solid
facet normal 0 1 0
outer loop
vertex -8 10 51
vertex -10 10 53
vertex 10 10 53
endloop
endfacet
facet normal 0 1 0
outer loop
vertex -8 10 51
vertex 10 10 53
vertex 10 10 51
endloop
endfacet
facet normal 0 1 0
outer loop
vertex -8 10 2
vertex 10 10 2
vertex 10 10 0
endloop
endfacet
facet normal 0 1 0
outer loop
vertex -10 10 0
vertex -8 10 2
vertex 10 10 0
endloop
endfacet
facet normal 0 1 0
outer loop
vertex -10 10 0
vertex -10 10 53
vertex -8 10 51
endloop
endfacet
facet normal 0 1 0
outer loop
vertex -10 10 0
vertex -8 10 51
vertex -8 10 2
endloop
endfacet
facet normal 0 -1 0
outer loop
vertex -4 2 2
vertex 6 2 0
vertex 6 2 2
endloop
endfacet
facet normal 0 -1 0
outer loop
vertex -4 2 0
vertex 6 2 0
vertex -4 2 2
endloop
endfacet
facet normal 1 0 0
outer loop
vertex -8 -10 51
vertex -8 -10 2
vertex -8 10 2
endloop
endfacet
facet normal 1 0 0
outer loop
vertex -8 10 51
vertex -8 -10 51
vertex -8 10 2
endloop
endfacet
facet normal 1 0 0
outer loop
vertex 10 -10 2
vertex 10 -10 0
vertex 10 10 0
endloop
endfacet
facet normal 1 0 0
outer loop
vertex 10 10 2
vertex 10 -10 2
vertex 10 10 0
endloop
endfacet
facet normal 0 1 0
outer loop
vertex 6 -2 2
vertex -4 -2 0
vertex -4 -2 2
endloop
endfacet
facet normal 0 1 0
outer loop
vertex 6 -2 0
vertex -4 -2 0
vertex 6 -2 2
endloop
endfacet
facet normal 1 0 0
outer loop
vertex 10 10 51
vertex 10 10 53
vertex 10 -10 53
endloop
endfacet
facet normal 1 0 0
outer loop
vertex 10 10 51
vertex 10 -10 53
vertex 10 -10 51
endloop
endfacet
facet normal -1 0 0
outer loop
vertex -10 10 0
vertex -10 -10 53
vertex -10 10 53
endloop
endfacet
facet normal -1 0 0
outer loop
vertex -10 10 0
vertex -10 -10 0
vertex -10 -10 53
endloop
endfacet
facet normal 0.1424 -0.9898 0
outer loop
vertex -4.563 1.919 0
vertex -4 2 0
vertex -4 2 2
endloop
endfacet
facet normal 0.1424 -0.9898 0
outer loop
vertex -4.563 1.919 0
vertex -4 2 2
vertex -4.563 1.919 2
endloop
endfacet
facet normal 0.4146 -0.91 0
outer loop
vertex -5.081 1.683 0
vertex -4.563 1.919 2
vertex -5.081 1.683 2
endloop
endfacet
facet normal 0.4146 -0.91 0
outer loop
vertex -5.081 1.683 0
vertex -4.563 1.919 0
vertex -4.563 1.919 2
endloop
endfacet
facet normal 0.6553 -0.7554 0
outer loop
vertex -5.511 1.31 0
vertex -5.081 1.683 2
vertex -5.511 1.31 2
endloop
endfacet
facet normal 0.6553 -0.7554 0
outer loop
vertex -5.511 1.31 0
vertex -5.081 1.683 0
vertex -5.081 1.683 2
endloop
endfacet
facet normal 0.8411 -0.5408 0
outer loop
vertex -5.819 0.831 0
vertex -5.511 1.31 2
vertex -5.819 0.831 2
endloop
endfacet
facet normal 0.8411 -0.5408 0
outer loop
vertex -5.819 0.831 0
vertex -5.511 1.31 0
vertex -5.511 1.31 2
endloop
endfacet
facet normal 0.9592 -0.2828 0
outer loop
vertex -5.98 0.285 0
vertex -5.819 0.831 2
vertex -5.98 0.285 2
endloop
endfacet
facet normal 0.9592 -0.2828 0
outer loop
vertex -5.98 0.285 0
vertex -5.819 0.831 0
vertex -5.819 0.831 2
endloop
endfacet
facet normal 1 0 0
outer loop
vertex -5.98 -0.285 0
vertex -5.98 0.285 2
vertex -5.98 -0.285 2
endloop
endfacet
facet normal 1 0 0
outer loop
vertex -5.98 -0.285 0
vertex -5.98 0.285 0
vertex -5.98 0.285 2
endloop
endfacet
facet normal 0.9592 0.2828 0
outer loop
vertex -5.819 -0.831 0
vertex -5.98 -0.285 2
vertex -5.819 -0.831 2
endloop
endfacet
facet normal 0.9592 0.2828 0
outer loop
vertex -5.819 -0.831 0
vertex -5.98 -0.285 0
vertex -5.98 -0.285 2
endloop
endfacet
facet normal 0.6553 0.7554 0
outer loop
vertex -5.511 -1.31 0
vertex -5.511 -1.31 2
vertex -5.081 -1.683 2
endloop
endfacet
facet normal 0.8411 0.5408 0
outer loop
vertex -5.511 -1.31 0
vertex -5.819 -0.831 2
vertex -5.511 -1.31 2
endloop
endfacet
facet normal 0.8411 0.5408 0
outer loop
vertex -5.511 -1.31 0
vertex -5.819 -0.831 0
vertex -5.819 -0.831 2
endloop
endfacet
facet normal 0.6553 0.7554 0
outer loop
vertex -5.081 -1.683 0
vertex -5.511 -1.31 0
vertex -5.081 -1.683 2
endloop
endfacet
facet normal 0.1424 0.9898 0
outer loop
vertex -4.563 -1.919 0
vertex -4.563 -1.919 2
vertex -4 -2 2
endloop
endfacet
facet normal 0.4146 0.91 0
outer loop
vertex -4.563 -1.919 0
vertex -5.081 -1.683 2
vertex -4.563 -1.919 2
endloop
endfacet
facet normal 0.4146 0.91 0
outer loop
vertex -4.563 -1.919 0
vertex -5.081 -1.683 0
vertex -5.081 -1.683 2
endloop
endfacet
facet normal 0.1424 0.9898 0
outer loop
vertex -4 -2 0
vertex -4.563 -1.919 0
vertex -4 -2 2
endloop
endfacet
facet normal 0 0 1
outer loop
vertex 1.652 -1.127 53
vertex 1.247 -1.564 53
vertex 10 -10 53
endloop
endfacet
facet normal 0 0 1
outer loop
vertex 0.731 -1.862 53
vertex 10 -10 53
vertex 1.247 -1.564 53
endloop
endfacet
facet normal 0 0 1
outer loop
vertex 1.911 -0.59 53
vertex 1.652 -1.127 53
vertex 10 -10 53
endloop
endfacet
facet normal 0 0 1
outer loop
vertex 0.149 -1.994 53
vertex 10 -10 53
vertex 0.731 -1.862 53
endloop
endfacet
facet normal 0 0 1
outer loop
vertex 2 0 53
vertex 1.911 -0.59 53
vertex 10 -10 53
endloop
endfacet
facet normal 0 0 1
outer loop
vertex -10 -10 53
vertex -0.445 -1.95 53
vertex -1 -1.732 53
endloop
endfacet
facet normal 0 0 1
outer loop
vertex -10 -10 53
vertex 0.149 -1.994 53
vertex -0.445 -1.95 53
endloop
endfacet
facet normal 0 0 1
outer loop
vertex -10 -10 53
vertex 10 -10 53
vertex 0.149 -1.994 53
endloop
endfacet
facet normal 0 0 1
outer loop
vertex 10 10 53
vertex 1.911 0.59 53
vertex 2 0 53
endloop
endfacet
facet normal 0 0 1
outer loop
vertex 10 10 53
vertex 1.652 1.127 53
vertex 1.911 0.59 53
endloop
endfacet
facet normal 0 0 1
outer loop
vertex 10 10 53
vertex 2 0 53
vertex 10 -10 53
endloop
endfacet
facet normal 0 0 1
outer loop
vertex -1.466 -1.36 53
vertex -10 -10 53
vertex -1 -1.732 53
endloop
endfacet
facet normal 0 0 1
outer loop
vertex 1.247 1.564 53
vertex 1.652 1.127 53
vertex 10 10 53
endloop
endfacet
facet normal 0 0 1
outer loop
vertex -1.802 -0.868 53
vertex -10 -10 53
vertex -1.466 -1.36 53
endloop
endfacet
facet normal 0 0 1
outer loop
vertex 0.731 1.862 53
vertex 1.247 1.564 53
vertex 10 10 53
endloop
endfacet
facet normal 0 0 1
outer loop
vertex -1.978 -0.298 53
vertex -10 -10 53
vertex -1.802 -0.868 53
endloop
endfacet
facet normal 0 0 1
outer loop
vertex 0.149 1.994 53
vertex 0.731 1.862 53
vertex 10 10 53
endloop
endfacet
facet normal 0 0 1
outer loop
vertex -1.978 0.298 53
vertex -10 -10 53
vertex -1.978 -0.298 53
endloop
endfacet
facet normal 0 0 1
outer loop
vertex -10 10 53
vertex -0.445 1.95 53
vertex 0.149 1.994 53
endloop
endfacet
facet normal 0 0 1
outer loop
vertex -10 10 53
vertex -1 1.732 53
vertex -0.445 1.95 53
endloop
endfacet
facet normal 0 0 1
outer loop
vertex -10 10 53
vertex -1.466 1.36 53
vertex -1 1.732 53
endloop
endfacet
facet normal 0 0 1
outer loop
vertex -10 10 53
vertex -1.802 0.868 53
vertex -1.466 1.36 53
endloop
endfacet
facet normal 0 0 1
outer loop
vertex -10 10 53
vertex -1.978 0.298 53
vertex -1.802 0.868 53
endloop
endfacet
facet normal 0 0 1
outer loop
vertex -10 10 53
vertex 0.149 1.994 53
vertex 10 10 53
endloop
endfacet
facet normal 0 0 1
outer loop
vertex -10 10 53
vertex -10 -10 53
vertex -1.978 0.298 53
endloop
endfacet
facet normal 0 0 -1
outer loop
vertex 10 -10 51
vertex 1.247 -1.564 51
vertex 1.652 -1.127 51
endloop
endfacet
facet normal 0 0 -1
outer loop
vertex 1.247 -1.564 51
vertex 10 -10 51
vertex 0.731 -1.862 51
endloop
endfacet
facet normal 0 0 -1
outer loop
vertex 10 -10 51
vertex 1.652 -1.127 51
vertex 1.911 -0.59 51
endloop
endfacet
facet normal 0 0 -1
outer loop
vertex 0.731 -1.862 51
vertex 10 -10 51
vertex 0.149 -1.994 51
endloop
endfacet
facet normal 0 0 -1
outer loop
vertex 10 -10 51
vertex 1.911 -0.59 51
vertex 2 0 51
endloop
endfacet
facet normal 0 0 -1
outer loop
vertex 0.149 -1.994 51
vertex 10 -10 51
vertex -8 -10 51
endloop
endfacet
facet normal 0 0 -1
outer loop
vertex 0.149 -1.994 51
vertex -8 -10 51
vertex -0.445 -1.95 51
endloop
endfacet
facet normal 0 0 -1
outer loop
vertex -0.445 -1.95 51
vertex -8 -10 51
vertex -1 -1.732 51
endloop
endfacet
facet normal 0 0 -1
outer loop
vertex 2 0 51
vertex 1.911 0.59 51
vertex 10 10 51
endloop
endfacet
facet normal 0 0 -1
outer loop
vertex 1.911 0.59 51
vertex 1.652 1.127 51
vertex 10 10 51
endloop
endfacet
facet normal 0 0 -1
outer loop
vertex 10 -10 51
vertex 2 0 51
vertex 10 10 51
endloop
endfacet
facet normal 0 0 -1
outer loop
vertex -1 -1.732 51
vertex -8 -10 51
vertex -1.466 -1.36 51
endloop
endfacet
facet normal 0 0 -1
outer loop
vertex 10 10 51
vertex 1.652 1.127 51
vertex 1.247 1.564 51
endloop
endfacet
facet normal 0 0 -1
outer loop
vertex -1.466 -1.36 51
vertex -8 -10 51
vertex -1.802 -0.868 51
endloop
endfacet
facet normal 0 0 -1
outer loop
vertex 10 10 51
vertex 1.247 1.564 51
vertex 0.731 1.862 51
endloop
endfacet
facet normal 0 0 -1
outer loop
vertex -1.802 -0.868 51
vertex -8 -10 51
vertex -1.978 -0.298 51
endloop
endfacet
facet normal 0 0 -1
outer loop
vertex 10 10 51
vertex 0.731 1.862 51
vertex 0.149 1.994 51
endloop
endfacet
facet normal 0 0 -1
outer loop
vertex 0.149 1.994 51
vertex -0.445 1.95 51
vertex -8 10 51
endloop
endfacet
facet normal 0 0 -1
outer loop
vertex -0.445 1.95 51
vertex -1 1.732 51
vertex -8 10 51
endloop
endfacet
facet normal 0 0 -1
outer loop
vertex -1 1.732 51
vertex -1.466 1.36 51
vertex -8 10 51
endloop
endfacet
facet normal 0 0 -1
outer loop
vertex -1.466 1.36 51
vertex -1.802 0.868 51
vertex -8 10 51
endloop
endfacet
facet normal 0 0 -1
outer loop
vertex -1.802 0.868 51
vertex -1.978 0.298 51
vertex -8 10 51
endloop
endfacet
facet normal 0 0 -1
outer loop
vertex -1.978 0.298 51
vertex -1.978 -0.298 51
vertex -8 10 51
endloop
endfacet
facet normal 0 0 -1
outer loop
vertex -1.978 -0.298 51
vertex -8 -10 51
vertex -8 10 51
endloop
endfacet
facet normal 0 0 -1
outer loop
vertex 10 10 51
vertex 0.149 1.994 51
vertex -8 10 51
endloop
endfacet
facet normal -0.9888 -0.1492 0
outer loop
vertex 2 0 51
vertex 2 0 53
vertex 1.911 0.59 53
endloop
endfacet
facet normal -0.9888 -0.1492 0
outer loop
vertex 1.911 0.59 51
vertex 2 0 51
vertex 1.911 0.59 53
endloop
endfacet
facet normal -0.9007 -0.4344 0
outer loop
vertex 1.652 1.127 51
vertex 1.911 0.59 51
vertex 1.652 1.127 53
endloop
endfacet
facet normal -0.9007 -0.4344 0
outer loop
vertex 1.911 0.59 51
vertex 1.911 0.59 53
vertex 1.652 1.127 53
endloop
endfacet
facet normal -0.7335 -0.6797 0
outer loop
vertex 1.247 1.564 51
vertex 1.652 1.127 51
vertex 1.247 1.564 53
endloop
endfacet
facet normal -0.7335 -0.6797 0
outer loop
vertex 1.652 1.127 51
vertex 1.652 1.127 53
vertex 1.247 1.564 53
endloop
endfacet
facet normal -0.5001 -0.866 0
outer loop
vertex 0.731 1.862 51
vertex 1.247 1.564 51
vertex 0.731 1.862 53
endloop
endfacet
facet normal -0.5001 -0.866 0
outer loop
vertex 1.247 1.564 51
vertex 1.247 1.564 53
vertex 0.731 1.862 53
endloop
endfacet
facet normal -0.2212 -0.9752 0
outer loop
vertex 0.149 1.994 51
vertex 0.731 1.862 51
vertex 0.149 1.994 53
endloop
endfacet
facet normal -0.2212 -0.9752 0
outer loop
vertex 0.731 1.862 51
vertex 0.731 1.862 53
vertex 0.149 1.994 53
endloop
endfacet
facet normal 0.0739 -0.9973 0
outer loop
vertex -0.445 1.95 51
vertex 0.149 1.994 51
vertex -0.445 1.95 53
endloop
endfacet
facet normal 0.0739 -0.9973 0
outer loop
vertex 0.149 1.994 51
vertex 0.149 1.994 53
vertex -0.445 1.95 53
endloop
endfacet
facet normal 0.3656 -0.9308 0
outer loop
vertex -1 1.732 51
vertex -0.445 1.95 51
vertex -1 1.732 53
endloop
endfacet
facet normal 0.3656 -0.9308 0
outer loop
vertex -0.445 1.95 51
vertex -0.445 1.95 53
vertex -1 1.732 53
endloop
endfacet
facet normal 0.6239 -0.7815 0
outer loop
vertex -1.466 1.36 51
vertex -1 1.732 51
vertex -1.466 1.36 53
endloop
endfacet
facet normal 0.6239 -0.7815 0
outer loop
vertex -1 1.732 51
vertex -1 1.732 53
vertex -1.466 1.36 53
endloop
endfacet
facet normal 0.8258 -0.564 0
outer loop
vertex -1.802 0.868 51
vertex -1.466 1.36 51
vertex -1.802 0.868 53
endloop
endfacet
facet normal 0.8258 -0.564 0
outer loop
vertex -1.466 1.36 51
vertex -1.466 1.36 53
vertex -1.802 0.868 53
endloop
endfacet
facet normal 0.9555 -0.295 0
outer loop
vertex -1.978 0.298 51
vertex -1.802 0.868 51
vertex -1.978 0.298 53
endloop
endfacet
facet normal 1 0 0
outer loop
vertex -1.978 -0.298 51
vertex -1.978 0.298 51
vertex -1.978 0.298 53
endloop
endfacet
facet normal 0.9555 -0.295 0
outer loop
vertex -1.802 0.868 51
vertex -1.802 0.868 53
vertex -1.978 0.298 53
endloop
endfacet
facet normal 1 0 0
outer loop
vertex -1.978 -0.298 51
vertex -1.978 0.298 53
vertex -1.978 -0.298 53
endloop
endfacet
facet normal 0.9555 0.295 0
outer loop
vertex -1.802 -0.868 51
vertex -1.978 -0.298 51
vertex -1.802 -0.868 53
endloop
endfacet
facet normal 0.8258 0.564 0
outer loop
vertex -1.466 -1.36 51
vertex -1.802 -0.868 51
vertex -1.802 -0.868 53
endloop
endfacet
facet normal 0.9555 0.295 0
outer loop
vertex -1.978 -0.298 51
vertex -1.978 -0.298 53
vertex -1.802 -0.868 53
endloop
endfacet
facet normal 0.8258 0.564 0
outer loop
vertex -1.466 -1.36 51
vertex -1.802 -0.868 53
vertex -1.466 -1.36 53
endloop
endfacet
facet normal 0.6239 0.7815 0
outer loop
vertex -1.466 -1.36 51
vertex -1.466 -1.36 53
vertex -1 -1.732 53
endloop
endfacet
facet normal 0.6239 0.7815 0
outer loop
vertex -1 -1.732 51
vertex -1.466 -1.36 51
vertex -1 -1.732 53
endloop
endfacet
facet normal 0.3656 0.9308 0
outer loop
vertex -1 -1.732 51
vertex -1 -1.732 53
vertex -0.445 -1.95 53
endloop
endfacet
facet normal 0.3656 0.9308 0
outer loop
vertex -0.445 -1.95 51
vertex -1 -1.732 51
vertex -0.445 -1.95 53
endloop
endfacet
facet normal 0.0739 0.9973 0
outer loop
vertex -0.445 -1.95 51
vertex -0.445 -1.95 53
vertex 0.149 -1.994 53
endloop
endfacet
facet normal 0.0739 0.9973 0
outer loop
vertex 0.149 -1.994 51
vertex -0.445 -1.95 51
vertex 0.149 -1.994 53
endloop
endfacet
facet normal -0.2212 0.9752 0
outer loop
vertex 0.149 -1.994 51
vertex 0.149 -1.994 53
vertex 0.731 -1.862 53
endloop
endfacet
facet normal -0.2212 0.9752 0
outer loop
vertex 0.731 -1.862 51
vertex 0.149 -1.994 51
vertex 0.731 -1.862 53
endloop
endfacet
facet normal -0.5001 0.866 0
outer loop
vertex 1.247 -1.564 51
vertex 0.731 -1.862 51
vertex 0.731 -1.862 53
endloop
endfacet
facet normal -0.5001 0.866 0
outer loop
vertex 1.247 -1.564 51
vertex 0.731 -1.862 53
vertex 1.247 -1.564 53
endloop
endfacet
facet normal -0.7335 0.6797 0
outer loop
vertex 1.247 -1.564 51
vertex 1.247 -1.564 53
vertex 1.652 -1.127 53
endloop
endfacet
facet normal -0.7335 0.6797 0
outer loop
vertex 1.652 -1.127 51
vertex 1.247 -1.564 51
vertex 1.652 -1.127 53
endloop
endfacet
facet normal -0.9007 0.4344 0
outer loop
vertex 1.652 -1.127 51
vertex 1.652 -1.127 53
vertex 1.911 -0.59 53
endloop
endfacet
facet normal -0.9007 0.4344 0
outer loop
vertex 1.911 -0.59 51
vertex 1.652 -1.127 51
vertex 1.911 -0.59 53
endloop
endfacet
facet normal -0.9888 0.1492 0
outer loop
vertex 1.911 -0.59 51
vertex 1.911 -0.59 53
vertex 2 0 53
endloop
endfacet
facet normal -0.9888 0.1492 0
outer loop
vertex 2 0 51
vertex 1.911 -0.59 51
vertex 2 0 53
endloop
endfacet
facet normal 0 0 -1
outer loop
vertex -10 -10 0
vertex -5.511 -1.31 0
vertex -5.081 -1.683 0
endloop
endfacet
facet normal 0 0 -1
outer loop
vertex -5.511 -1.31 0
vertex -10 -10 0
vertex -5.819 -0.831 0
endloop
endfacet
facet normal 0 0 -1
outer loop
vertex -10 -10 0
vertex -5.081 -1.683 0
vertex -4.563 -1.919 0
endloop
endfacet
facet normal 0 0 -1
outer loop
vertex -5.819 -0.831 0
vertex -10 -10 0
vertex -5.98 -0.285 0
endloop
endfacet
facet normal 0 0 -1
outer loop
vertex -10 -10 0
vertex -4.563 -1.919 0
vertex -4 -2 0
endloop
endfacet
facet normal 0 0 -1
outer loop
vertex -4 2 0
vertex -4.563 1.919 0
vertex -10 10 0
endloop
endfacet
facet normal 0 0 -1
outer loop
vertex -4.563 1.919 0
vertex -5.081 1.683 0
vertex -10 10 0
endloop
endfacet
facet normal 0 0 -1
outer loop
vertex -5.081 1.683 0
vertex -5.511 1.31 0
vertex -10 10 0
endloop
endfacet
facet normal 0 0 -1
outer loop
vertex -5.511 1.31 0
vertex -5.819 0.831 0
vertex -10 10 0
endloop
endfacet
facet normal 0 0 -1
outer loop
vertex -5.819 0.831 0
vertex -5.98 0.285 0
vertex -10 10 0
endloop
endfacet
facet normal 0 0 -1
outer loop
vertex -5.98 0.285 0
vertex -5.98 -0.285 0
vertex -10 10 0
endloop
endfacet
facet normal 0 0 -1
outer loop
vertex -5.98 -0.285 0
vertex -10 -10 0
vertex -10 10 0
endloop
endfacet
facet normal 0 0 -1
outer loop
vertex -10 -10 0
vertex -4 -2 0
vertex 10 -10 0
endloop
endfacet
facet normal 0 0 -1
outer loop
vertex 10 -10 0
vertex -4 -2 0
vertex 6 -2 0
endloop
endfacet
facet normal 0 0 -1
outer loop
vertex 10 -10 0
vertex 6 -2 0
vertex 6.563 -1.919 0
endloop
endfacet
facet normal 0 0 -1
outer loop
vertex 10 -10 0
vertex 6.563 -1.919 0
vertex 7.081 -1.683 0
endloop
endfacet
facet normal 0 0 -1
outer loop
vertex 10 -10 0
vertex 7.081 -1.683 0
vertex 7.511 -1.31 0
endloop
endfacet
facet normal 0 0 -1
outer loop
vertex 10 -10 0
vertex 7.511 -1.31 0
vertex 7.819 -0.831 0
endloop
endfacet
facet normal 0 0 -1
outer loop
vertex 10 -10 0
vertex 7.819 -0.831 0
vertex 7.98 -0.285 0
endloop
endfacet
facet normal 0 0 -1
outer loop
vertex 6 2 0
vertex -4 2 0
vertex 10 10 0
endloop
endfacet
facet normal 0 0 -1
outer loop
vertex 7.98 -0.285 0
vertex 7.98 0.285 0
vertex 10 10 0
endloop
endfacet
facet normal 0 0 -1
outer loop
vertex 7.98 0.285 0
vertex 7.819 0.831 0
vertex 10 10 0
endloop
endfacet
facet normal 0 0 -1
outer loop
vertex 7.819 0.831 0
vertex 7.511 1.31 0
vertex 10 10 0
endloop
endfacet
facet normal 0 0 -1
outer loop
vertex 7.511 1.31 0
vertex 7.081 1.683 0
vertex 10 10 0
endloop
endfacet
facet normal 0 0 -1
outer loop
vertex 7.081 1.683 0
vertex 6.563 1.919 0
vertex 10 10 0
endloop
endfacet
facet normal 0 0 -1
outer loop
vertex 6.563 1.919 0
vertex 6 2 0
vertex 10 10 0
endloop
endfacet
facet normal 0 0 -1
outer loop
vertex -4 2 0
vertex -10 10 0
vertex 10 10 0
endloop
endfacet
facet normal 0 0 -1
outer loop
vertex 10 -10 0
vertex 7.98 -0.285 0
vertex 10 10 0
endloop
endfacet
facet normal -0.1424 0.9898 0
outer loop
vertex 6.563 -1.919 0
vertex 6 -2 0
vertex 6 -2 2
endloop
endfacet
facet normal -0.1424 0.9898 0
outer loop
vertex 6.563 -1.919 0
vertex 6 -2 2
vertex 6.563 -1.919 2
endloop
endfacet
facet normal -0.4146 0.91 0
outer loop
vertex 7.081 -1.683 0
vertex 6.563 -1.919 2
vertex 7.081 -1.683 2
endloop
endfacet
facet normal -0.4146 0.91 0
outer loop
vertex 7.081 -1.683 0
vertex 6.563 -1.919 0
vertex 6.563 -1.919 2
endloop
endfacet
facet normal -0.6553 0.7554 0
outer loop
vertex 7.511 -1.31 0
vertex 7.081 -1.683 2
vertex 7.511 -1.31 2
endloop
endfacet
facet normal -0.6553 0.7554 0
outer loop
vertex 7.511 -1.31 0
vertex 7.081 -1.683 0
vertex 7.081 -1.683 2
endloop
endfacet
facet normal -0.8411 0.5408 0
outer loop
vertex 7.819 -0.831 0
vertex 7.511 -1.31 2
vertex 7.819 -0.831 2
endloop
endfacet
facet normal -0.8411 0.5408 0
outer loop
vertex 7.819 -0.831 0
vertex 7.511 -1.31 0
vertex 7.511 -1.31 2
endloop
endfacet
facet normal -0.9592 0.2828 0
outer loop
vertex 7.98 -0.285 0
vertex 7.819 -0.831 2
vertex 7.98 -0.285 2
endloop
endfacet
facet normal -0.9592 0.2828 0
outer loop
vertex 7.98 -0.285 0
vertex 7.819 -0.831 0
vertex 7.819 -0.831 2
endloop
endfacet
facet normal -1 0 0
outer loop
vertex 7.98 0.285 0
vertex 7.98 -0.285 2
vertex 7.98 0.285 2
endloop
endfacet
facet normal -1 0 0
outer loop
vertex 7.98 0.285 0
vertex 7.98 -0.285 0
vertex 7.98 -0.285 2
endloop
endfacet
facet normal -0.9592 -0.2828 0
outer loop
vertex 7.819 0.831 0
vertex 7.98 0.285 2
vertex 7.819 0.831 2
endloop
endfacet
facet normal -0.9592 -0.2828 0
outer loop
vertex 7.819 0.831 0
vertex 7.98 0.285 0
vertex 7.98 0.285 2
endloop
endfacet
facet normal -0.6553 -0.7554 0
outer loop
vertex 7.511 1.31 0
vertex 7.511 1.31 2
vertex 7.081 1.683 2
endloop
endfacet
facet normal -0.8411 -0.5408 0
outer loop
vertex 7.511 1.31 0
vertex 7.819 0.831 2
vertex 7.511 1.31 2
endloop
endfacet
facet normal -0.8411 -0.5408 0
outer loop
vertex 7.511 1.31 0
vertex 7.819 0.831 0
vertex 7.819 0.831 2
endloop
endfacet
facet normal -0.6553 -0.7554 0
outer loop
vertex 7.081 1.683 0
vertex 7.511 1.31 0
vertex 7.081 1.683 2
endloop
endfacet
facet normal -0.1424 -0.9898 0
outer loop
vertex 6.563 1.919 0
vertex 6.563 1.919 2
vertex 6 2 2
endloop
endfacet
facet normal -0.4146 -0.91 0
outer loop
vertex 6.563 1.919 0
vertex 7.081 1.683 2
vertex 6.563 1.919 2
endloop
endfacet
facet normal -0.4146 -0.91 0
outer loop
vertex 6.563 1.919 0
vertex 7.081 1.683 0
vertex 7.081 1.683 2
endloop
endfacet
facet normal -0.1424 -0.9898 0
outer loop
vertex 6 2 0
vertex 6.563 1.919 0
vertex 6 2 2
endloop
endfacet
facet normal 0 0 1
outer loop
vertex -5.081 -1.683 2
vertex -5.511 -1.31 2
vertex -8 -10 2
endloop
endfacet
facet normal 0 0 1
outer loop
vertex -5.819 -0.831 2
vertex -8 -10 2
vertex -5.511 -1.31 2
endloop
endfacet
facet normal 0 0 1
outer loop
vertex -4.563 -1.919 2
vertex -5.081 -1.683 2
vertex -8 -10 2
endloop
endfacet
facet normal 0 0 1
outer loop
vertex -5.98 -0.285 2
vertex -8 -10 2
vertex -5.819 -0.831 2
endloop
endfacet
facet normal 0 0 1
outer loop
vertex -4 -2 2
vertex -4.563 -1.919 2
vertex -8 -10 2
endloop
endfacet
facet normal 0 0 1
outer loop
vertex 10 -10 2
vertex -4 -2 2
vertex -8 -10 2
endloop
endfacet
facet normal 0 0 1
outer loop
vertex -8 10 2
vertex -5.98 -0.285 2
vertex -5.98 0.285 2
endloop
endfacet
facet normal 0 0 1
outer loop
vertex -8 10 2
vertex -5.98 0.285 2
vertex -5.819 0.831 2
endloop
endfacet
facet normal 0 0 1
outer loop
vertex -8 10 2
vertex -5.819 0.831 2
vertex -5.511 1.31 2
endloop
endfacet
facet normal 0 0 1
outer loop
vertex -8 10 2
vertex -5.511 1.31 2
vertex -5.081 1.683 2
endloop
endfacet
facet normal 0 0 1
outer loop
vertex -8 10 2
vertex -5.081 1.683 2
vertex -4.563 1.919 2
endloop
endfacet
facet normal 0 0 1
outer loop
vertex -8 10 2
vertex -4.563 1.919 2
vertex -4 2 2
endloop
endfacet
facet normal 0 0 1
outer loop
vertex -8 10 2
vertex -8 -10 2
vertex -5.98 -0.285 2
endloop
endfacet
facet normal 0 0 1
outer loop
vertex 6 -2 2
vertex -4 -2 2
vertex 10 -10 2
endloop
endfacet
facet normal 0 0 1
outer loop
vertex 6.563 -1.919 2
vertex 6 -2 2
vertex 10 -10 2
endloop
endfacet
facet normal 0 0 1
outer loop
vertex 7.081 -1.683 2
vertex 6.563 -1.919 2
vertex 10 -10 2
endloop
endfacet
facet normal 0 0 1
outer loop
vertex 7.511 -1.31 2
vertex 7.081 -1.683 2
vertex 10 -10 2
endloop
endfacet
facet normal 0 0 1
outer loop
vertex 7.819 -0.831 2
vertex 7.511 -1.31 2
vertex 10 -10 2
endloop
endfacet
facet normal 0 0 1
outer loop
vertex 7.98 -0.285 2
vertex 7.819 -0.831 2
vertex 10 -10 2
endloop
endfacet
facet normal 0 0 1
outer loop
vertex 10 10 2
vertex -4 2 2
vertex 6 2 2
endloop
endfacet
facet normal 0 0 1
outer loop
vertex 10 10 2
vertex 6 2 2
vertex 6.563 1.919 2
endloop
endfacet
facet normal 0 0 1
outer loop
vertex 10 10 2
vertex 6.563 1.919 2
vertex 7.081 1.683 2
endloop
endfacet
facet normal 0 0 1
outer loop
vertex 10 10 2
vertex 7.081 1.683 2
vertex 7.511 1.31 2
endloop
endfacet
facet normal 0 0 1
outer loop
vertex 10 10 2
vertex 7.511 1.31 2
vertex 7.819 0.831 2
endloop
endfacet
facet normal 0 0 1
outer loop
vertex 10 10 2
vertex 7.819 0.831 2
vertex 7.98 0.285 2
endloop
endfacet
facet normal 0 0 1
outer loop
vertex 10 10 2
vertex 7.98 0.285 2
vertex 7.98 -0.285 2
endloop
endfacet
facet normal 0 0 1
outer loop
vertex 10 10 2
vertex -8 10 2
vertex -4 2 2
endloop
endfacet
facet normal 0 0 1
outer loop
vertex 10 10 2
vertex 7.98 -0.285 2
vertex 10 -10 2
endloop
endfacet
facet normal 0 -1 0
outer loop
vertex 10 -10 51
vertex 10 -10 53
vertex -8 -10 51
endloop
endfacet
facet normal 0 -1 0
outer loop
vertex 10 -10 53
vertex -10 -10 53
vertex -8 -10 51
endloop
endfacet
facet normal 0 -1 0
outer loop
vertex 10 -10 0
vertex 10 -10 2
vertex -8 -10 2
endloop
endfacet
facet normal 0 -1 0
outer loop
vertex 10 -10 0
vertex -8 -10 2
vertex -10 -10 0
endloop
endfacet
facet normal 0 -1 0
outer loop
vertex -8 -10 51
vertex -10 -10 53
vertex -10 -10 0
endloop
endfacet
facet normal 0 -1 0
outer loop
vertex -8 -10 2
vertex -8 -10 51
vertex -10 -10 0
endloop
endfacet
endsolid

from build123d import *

# Parameters (mm, degrees)
SKETCH1_W           = 20
SKETCH1_H           = 20
BOSS_EXTRUDE1_DEPTH = 2
SKETCH2_W           = 2
SKETCH2_H           = 20
BOSS_EXTRUDE2_DEPTH = 51
SKETCH3_W           = 2
SKETCH3_H           = 20
BOSS_EXTRUDE3_DEPTH = 18
SKETCH4_R           = 2
CUT_EXTRUDE1_DEPTH  = 18
CUT_EXTRUDE2_DEPTH  = 18


with BuildPart() as part:
    # Sketch1 → Boss-Extrude1 (new body)
    with BuildSketch(Plane.XY):
        Rectangle(SKETCH1_W, SKETCH1_H)
    extrude(amount=BOSS_EXTRUDE1_DEPTH)

    # Sketch2 → Boss-Extrude2 (add)
    with BuildSketch(Plane.XY.offset(2)):
        with Locations((-9, 0)):
            Rectangle(SKETCH2_W, SKETCH2_H)
    extrude(amount=BOSS_EXTRUDE2_DEPTH)

    # Sketch3 → Boss-Extrude3 (add)
    with BuildSketch(Plane(origin=(-8, 0, 0), x_dir=(0, 0, -1), z_dir=(1, 0, 0))):
        with Locations((-52, 0)):
            Rectangle(SKETCH3_W, SKETCH3_H)
    extrude(amount=BOSS_EXTRUDE3_DEPTH)

    # Sketch4 → Cut-Extrude1 (cut)
    with BuildSketch(Plane.XY.offset(53)):
        Circle(SKETCH4_R)
    extrude(amount=-CUT_EXTRUDE1_DEPTH, mode=Mode.SUBTRACT)

    # Sketch5 → Cut-Extrude2 (cut)
    with BuildSketch(Plane(origin=(0, 0, 0), x_dir=(-1, 0, 0), z_dir=(0, 0, -1))):
        with BuildLine():
            Line((-6, 2), (4, 2))
            ThreePointArc((4, 2), (6, 0), (4, -2))
            Line((4, -2), (-6, -2))
            ThreePointArc((-6, -2), (-8, 0), (-6, 2))
        make_face()
    extrude(amount=-CUT_EXTRUDE2_DEPTH, mode=Mode.SUBTRACT)


solid = part.part
